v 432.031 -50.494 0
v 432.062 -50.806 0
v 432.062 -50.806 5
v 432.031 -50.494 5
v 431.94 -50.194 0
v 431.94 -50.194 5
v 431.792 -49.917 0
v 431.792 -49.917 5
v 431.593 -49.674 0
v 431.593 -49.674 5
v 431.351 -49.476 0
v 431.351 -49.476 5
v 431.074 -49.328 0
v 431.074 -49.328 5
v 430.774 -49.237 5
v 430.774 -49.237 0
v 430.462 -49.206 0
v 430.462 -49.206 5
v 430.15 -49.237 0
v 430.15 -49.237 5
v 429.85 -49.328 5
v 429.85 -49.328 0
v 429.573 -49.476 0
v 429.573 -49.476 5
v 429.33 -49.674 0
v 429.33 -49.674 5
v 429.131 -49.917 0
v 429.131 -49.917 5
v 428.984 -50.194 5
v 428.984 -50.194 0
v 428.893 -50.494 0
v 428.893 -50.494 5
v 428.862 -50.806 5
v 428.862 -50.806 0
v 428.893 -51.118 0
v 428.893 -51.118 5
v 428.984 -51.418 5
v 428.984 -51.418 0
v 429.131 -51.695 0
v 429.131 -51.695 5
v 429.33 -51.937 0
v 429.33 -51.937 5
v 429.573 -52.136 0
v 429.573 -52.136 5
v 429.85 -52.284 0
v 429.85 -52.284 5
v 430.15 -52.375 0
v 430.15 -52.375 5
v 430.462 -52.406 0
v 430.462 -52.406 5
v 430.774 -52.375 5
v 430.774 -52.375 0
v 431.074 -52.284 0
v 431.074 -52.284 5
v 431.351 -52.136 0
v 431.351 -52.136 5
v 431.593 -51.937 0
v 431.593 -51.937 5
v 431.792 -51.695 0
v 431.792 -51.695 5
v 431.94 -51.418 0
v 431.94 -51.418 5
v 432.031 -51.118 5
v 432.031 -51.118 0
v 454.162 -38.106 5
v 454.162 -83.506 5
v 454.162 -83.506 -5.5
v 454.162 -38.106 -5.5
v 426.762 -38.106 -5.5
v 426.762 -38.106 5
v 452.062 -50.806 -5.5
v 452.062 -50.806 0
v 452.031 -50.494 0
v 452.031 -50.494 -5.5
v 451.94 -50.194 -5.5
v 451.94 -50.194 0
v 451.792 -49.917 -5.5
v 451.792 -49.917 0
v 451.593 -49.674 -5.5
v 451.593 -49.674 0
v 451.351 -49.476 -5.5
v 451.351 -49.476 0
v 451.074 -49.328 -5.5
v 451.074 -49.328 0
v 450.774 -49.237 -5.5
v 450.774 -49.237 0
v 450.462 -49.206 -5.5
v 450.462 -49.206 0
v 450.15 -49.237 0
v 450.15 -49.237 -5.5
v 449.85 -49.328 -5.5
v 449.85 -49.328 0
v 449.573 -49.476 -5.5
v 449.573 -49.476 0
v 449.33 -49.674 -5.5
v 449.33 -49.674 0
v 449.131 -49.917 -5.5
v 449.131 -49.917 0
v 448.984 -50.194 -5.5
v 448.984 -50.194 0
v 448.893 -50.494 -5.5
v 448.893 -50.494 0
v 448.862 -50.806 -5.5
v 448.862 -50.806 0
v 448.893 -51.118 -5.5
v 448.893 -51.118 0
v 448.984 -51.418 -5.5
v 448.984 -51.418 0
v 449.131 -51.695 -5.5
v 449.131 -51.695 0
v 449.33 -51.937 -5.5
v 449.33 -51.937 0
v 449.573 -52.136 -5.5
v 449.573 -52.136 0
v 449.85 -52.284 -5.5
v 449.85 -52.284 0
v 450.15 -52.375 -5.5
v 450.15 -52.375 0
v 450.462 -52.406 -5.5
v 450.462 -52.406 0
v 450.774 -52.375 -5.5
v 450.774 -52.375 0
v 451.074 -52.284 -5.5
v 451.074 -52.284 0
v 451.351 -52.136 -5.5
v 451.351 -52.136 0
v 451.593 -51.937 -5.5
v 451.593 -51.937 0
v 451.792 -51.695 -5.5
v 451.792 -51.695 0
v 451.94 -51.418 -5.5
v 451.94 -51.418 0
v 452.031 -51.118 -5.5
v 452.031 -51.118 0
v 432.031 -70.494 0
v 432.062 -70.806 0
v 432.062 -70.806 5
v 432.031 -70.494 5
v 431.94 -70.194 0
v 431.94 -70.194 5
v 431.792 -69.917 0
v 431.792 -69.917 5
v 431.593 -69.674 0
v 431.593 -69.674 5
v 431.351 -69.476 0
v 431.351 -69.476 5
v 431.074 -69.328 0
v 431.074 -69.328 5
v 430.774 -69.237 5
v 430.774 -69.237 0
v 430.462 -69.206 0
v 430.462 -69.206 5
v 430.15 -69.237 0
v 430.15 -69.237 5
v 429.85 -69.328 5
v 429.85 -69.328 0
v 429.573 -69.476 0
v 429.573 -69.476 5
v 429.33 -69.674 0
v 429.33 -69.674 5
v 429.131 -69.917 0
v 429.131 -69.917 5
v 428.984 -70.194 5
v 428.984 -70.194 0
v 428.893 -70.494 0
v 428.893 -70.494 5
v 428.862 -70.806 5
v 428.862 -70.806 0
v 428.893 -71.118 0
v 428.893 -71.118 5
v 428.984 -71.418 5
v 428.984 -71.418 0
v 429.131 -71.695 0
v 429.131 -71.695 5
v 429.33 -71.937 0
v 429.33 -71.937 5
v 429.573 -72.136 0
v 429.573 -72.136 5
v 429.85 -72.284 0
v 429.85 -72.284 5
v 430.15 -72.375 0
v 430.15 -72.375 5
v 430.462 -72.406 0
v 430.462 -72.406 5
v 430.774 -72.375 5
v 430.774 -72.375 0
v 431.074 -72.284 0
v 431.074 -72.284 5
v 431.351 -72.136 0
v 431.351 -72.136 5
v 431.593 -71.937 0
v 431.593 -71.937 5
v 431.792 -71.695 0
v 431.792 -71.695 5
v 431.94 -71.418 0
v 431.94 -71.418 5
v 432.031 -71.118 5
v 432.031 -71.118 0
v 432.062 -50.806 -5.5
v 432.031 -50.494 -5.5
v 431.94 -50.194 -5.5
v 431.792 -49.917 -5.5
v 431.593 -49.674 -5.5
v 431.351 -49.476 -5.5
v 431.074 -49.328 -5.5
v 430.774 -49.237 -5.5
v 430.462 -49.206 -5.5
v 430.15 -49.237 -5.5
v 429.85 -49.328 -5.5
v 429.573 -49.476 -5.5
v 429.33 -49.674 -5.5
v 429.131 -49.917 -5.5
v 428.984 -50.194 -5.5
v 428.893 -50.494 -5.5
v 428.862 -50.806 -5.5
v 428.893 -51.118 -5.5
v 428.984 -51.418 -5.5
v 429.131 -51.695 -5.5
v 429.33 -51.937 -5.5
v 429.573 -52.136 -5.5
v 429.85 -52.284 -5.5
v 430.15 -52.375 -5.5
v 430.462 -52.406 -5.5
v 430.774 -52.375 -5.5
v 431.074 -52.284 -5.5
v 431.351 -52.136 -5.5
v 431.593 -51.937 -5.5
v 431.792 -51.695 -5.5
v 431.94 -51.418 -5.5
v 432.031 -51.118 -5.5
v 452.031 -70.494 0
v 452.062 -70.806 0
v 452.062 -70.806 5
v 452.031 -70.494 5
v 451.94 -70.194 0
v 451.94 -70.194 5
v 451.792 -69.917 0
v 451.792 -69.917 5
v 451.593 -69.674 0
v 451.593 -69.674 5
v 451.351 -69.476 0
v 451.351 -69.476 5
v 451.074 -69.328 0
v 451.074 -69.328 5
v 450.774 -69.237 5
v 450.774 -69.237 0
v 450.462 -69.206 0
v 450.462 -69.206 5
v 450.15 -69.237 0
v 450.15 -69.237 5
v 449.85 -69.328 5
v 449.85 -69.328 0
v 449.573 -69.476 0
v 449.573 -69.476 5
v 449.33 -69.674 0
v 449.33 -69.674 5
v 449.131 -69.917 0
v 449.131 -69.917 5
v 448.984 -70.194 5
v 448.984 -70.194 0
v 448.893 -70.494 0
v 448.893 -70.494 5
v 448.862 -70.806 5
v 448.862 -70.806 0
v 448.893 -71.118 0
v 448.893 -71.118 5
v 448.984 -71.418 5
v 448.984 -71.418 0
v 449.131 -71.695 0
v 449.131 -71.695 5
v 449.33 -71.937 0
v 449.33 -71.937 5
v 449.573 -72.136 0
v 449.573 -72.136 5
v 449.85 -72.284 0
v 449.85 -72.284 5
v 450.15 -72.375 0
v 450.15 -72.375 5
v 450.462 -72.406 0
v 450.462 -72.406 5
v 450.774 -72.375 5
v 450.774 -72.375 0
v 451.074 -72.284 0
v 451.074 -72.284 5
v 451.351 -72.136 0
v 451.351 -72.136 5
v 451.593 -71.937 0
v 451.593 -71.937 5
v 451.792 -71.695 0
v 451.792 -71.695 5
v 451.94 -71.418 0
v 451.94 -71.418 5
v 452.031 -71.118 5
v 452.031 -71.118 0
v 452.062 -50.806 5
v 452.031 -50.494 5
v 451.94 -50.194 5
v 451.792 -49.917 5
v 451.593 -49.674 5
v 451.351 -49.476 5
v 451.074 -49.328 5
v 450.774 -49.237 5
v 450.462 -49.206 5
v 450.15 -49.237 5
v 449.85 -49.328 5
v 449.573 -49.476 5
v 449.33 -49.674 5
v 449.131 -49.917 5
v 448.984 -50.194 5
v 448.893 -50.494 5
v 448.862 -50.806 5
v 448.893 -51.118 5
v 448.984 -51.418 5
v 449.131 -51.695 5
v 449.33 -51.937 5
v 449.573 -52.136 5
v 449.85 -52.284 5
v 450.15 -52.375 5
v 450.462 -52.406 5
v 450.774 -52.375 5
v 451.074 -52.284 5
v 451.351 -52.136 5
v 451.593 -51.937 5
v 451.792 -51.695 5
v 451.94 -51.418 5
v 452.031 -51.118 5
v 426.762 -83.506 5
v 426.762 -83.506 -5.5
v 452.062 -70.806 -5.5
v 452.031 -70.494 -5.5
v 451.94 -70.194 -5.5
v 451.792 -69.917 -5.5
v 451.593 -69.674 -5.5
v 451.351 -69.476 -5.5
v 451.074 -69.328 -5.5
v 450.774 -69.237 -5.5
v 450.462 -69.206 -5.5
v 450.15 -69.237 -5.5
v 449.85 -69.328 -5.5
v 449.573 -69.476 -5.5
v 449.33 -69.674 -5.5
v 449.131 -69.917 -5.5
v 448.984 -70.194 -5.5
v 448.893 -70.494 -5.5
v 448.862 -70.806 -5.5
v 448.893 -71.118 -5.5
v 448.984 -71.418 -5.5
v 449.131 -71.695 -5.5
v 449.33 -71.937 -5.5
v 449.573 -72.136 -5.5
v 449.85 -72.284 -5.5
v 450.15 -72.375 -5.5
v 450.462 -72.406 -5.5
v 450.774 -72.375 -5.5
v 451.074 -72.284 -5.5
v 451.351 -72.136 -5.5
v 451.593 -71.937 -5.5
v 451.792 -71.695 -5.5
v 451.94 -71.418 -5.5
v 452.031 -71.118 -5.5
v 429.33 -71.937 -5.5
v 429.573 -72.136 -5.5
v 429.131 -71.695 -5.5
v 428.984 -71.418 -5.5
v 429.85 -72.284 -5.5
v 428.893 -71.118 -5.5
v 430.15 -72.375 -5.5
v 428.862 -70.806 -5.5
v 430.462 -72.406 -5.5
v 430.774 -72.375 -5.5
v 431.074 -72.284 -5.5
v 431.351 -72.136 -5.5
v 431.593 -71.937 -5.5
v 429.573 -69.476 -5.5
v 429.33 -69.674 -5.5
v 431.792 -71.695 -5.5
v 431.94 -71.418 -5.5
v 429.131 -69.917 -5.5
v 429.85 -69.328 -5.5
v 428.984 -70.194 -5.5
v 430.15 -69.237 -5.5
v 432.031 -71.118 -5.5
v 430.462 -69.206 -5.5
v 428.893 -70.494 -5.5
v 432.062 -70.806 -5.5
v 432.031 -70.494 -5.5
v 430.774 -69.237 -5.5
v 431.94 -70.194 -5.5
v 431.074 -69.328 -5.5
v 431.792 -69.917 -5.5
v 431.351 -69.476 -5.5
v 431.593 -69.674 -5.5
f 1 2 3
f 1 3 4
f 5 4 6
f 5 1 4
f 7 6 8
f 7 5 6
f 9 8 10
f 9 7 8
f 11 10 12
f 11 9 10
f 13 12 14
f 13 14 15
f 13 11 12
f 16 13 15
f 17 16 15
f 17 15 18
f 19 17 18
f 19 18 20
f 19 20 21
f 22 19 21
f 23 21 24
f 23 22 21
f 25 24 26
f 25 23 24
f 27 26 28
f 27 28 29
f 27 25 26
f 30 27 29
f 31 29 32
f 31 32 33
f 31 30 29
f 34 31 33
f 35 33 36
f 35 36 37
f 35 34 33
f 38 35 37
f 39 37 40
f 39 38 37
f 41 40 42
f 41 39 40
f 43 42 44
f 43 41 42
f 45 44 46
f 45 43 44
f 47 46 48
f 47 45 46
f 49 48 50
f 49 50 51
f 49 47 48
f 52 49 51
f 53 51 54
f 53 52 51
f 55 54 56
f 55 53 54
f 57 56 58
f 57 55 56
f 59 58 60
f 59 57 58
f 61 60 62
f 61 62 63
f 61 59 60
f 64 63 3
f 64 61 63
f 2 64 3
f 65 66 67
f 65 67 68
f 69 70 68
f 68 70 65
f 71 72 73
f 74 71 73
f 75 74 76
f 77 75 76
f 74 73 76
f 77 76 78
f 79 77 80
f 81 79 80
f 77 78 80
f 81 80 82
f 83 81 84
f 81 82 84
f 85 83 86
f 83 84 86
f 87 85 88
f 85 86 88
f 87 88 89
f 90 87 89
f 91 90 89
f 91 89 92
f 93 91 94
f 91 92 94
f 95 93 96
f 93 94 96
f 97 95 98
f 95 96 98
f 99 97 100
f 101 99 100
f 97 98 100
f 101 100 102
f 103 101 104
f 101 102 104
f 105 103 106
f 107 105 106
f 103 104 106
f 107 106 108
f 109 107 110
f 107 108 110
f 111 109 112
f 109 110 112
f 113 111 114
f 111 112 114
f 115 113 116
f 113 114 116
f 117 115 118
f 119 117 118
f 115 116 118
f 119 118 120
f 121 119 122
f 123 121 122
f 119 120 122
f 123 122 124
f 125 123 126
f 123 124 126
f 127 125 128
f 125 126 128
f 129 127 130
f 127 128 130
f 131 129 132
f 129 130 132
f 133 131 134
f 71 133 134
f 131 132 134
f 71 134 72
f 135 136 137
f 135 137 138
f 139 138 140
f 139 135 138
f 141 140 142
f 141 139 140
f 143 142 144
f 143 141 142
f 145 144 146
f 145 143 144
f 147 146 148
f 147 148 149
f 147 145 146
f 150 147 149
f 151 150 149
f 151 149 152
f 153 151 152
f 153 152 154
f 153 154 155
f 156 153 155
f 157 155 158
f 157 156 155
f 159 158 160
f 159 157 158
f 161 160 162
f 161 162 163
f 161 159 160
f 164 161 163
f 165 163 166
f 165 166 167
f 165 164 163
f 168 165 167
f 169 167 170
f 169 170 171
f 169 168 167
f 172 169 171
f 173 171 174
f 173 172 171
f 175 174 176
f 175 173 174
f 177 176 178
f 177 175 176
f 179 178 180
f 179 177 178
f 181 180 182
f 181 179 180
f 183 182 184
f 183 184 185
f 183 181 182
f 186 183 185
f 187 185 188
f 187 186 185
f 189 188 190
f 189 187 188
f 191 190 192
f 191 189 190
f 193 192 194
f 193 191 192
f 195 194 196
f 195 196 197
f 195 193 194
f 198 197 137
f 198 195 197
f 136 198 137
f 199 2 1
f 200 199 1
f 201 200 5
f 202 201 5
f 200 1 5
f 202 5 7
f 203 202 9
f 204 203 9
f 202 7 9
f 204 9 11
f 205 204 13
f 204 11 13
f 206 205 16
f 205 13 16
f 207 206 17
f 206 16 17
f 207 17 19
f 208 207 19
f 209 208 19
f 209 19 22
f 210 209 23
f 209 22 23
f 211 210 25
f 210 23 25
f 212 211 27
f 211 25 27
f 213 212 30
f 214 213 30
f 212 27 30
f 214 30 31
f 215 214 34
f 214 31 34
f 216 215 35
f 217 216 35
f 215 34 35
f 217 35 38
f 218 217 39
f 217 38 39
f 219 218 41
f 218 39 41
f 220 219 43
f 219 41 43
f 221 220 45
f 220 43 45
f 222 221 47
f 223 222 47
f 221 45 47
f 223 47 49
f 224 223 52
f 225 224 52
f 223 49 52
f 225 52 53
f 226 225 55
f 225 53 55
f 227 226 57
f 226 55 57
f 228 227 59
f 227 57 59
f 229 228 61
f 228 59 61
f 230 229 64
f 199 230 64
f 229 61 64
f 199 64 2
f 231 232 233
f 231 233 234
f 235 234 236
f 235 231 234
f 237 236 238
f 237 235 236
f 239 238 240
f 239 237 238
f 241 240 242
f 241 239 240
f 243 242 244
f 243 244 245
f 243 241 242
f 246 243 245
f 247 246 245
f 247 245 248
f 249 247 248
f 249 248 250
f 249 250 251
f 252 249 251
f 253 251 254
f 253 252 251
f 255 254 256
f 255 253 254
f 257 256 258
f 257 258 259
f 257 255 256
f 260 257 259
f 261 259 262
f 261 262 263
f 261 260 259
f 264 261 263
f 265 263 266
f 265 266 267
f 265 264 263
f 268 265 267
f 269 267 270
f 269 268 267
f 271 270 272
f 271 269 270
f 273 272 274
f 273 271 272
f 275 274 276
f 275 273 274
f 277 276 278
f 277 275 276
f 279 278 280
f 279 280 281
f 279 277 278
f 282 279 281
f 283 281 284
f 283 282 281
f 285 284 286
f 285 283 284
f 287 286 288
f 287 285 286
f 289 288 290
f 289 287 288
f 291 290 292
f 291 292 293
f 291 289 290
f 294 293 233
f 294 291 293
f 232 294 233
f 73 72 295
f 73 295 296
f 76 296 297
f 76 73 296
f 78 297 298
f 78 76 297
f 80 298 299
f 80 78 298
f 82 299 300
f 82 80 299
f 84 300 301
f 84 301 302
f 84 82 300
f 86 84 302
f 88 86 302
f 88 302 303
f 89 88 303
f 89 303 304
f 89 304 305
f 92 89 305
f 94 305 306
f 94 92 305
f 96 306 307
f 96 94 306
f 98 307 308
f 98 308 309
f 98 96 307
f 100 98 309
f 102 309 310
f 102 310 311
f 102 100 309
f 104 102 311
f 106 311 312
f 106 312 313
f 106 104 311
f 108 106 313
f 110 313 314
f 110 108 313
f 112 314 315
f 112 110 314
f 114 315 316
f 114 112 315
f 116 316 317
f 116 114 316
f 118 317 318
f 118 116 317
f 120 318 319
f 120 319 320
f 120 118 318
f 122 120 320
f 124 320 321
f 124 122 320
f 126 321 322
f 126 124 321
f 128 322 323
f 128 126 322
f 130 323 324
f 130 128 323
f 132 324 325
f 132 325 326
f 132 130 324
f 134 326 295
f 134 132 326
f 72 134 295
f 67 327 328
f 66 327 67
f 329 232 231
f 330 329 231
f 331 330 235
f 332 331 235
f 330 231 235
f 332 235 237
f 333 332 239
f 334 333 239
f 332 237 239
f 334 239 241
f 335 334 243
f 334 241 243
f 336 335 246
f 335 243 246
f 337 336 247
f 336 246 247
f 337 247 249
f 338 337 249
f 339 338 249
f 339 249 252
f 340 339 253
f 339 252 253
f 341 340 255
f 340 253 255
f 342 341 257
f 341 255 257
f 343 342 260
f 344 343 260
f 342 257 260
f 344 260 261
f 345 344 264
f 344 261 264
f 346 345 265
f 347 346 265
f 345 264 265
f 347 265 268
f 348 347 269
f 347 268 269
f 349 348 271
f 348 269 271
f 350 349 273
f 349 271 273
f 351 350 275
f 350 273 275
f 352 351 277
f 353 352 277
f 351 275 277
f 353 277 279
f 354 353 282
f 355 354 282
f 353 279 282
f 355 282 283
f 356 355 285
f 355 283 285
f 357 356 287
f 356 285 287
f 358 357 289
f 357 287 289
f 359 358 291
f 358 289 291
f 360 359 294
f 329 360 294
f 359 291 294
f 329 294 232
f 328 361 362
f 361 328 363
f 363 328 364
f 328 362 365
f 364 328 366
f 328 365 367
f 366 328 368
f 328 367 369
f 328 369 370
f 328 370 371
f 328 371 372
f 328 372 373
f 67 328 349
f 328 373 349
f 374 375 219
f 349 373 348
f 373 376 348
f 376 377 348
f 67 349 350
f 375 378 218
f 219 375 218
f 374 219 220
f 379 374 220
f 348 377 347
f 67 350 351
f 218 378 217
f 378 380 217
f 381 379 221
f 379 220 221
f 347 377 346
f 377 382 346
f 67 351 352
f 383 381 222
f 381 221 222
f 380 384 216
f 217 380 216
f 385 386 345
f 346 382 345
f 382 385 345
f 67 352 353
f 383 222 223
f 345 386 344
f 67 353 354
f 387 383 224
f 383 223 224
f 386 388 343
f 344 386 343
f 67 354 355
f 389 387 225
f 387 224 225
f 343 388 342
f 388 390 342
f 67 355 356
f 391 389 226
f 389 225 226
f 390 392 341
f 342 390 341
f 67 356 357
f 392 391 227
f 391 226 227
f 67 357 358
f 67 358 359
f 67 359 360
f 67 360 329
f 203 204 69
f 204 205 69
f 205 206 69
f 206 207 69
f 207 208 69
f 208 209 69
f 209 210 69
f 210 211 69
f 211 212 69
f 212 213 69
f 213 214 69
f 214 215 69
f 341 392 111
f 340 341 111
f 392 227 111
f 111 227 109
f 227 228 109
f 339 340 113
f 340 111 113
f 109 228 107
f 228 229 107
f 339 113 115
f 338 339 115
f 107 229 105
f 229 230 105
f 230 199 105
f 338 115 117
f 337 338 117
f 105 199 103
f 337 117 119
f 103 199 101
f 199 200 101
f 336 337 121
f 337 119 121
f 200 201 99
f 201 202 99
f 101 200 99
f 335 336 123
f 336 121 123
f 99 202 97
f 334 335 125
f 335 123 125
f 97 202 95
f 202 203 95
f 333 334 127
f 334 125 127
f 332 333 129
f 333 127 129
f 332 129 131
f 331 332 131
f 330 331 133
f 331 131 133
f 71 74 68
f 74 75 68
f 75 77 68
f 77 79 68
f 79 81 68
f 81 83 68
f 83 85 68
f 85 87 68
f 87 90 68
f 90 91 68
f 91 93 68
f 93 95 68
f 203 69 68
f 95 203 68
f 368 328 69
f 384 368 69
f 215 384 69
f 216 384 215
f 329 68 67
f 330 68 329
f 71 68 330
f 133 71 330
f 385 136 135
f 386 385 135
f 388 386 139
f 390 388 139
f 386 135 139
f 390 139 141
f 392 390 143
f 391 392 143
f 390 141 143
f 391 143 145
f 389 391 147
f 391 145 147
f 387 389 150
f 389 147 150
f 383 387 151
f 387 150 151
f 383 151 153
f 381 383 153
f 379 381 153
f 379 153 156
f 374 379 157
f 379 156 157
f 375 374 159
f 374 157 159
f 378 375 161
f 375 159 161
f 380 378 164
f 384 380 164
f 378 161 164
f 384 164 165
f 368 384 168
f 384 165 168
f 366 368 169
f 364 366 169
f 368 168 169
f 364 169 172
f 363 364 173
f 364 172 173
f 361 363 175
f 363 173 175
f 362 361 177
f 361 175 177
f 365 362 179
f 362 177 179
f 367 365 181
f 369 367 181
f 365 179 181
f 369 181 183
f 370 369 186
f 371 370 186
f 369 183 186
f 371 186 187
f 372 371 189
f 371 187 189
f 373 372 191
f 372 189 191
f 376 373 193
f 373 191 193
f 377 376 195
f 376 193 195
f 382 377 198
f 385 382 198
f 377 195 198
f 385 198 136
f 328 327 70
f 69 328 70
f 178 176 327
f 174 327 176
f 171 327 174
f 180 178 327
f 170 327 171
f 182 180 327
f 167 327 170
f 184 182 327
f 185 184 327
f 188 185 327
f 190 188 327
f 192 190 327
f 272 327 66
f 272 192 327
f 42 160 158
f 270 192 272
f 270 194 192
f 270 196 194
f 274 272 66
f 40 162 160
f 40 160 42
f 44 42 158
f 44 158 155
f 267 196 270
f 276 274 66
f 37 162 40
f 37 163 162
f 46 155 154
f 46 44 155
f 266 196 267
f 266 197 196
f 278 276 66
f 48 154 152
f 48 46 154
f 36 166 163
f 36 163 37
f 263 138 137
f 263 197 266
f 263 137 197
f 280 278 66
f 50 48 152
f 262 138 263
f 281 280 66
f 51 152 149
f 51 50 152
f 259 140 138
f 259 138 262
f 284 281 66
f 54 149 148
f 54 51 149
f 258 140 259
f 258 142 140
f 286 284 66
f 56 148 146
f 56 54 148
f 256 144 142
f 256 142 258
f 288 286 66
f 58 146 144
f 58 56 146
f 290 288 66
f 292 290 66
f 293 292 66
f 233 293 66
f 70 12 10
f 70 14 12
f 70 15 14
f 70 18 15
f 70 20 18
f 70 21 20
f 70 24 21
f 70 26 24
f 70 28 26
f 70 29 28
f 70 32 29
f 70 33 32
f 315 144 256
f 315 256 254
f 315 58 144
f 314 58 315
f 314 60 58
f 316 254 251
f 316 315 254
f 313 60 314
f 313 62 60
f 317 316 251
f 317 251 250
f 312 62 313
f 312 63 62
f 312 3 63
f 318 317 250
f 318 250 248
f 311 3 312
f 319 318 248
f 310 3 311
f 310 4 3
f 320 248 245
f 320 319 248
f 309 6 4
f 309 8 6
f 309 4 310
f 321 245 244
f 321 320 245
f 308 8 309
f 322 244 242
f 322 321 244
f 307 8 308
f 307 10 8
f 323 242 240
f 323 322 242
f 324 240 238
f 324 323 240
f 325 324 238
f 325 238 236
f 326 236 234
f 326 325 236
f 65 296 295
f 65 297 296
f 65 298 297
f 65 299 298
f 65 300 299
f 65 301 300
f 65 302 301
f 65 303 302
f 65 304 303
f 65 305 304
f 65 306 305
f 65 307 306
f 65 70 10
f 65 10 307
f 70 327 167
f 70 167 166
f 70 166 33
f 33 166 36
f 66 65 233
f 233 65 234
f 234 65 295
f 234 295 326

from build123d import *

# Parameters (mm, degrees)
SKETCH1_W                = 27.4
SKETCH1_H                = 45.4
SKETCH1_R                = 1.6
SKETCH1_R_2              = 1.599999998
BOSS_EXTRUDE1_DEPTH      = 5
BOSS_EXTRUDE1_DEPTH_BACK = 5.5


with BuildPart() as part:
    # Sketch1 → Boss-Extrude1 (new body, two sides)
    with BuildSketch(Plane.XY) as boss_extrude1_sk:
        with Locations((440.461848113, -60.80586409)):
            Rectangle(SKETCH1_W, SKETCH1_H)
        with Locations((430.461848113, -70.80586409)):
            Circle(SKETCH1_R, mode=Mode.SUBTRACT)
        with Locations((430.461848113, -50.80586409)):
            Circle(SKETCH1_R_2, mode=Mode.SUBTRACT)
        with Locations((450.461848113, -50.80586409)):
            Circle(SKETCH1_R_2, mode=Mode.SUBTRACT)
        with Locations((450.461848113, -70.80586409)):
            Circle(SKETCH1_R, mode=Mode.SUBTRACT)
    extrude(amount=BOSS_EXTRUDE1_DEPTH)
    extrude(boss_extrude1_sk.sketch, amount=-BOSS_EXTRUDE1_DEPTH_BACK)


solid = part.part
